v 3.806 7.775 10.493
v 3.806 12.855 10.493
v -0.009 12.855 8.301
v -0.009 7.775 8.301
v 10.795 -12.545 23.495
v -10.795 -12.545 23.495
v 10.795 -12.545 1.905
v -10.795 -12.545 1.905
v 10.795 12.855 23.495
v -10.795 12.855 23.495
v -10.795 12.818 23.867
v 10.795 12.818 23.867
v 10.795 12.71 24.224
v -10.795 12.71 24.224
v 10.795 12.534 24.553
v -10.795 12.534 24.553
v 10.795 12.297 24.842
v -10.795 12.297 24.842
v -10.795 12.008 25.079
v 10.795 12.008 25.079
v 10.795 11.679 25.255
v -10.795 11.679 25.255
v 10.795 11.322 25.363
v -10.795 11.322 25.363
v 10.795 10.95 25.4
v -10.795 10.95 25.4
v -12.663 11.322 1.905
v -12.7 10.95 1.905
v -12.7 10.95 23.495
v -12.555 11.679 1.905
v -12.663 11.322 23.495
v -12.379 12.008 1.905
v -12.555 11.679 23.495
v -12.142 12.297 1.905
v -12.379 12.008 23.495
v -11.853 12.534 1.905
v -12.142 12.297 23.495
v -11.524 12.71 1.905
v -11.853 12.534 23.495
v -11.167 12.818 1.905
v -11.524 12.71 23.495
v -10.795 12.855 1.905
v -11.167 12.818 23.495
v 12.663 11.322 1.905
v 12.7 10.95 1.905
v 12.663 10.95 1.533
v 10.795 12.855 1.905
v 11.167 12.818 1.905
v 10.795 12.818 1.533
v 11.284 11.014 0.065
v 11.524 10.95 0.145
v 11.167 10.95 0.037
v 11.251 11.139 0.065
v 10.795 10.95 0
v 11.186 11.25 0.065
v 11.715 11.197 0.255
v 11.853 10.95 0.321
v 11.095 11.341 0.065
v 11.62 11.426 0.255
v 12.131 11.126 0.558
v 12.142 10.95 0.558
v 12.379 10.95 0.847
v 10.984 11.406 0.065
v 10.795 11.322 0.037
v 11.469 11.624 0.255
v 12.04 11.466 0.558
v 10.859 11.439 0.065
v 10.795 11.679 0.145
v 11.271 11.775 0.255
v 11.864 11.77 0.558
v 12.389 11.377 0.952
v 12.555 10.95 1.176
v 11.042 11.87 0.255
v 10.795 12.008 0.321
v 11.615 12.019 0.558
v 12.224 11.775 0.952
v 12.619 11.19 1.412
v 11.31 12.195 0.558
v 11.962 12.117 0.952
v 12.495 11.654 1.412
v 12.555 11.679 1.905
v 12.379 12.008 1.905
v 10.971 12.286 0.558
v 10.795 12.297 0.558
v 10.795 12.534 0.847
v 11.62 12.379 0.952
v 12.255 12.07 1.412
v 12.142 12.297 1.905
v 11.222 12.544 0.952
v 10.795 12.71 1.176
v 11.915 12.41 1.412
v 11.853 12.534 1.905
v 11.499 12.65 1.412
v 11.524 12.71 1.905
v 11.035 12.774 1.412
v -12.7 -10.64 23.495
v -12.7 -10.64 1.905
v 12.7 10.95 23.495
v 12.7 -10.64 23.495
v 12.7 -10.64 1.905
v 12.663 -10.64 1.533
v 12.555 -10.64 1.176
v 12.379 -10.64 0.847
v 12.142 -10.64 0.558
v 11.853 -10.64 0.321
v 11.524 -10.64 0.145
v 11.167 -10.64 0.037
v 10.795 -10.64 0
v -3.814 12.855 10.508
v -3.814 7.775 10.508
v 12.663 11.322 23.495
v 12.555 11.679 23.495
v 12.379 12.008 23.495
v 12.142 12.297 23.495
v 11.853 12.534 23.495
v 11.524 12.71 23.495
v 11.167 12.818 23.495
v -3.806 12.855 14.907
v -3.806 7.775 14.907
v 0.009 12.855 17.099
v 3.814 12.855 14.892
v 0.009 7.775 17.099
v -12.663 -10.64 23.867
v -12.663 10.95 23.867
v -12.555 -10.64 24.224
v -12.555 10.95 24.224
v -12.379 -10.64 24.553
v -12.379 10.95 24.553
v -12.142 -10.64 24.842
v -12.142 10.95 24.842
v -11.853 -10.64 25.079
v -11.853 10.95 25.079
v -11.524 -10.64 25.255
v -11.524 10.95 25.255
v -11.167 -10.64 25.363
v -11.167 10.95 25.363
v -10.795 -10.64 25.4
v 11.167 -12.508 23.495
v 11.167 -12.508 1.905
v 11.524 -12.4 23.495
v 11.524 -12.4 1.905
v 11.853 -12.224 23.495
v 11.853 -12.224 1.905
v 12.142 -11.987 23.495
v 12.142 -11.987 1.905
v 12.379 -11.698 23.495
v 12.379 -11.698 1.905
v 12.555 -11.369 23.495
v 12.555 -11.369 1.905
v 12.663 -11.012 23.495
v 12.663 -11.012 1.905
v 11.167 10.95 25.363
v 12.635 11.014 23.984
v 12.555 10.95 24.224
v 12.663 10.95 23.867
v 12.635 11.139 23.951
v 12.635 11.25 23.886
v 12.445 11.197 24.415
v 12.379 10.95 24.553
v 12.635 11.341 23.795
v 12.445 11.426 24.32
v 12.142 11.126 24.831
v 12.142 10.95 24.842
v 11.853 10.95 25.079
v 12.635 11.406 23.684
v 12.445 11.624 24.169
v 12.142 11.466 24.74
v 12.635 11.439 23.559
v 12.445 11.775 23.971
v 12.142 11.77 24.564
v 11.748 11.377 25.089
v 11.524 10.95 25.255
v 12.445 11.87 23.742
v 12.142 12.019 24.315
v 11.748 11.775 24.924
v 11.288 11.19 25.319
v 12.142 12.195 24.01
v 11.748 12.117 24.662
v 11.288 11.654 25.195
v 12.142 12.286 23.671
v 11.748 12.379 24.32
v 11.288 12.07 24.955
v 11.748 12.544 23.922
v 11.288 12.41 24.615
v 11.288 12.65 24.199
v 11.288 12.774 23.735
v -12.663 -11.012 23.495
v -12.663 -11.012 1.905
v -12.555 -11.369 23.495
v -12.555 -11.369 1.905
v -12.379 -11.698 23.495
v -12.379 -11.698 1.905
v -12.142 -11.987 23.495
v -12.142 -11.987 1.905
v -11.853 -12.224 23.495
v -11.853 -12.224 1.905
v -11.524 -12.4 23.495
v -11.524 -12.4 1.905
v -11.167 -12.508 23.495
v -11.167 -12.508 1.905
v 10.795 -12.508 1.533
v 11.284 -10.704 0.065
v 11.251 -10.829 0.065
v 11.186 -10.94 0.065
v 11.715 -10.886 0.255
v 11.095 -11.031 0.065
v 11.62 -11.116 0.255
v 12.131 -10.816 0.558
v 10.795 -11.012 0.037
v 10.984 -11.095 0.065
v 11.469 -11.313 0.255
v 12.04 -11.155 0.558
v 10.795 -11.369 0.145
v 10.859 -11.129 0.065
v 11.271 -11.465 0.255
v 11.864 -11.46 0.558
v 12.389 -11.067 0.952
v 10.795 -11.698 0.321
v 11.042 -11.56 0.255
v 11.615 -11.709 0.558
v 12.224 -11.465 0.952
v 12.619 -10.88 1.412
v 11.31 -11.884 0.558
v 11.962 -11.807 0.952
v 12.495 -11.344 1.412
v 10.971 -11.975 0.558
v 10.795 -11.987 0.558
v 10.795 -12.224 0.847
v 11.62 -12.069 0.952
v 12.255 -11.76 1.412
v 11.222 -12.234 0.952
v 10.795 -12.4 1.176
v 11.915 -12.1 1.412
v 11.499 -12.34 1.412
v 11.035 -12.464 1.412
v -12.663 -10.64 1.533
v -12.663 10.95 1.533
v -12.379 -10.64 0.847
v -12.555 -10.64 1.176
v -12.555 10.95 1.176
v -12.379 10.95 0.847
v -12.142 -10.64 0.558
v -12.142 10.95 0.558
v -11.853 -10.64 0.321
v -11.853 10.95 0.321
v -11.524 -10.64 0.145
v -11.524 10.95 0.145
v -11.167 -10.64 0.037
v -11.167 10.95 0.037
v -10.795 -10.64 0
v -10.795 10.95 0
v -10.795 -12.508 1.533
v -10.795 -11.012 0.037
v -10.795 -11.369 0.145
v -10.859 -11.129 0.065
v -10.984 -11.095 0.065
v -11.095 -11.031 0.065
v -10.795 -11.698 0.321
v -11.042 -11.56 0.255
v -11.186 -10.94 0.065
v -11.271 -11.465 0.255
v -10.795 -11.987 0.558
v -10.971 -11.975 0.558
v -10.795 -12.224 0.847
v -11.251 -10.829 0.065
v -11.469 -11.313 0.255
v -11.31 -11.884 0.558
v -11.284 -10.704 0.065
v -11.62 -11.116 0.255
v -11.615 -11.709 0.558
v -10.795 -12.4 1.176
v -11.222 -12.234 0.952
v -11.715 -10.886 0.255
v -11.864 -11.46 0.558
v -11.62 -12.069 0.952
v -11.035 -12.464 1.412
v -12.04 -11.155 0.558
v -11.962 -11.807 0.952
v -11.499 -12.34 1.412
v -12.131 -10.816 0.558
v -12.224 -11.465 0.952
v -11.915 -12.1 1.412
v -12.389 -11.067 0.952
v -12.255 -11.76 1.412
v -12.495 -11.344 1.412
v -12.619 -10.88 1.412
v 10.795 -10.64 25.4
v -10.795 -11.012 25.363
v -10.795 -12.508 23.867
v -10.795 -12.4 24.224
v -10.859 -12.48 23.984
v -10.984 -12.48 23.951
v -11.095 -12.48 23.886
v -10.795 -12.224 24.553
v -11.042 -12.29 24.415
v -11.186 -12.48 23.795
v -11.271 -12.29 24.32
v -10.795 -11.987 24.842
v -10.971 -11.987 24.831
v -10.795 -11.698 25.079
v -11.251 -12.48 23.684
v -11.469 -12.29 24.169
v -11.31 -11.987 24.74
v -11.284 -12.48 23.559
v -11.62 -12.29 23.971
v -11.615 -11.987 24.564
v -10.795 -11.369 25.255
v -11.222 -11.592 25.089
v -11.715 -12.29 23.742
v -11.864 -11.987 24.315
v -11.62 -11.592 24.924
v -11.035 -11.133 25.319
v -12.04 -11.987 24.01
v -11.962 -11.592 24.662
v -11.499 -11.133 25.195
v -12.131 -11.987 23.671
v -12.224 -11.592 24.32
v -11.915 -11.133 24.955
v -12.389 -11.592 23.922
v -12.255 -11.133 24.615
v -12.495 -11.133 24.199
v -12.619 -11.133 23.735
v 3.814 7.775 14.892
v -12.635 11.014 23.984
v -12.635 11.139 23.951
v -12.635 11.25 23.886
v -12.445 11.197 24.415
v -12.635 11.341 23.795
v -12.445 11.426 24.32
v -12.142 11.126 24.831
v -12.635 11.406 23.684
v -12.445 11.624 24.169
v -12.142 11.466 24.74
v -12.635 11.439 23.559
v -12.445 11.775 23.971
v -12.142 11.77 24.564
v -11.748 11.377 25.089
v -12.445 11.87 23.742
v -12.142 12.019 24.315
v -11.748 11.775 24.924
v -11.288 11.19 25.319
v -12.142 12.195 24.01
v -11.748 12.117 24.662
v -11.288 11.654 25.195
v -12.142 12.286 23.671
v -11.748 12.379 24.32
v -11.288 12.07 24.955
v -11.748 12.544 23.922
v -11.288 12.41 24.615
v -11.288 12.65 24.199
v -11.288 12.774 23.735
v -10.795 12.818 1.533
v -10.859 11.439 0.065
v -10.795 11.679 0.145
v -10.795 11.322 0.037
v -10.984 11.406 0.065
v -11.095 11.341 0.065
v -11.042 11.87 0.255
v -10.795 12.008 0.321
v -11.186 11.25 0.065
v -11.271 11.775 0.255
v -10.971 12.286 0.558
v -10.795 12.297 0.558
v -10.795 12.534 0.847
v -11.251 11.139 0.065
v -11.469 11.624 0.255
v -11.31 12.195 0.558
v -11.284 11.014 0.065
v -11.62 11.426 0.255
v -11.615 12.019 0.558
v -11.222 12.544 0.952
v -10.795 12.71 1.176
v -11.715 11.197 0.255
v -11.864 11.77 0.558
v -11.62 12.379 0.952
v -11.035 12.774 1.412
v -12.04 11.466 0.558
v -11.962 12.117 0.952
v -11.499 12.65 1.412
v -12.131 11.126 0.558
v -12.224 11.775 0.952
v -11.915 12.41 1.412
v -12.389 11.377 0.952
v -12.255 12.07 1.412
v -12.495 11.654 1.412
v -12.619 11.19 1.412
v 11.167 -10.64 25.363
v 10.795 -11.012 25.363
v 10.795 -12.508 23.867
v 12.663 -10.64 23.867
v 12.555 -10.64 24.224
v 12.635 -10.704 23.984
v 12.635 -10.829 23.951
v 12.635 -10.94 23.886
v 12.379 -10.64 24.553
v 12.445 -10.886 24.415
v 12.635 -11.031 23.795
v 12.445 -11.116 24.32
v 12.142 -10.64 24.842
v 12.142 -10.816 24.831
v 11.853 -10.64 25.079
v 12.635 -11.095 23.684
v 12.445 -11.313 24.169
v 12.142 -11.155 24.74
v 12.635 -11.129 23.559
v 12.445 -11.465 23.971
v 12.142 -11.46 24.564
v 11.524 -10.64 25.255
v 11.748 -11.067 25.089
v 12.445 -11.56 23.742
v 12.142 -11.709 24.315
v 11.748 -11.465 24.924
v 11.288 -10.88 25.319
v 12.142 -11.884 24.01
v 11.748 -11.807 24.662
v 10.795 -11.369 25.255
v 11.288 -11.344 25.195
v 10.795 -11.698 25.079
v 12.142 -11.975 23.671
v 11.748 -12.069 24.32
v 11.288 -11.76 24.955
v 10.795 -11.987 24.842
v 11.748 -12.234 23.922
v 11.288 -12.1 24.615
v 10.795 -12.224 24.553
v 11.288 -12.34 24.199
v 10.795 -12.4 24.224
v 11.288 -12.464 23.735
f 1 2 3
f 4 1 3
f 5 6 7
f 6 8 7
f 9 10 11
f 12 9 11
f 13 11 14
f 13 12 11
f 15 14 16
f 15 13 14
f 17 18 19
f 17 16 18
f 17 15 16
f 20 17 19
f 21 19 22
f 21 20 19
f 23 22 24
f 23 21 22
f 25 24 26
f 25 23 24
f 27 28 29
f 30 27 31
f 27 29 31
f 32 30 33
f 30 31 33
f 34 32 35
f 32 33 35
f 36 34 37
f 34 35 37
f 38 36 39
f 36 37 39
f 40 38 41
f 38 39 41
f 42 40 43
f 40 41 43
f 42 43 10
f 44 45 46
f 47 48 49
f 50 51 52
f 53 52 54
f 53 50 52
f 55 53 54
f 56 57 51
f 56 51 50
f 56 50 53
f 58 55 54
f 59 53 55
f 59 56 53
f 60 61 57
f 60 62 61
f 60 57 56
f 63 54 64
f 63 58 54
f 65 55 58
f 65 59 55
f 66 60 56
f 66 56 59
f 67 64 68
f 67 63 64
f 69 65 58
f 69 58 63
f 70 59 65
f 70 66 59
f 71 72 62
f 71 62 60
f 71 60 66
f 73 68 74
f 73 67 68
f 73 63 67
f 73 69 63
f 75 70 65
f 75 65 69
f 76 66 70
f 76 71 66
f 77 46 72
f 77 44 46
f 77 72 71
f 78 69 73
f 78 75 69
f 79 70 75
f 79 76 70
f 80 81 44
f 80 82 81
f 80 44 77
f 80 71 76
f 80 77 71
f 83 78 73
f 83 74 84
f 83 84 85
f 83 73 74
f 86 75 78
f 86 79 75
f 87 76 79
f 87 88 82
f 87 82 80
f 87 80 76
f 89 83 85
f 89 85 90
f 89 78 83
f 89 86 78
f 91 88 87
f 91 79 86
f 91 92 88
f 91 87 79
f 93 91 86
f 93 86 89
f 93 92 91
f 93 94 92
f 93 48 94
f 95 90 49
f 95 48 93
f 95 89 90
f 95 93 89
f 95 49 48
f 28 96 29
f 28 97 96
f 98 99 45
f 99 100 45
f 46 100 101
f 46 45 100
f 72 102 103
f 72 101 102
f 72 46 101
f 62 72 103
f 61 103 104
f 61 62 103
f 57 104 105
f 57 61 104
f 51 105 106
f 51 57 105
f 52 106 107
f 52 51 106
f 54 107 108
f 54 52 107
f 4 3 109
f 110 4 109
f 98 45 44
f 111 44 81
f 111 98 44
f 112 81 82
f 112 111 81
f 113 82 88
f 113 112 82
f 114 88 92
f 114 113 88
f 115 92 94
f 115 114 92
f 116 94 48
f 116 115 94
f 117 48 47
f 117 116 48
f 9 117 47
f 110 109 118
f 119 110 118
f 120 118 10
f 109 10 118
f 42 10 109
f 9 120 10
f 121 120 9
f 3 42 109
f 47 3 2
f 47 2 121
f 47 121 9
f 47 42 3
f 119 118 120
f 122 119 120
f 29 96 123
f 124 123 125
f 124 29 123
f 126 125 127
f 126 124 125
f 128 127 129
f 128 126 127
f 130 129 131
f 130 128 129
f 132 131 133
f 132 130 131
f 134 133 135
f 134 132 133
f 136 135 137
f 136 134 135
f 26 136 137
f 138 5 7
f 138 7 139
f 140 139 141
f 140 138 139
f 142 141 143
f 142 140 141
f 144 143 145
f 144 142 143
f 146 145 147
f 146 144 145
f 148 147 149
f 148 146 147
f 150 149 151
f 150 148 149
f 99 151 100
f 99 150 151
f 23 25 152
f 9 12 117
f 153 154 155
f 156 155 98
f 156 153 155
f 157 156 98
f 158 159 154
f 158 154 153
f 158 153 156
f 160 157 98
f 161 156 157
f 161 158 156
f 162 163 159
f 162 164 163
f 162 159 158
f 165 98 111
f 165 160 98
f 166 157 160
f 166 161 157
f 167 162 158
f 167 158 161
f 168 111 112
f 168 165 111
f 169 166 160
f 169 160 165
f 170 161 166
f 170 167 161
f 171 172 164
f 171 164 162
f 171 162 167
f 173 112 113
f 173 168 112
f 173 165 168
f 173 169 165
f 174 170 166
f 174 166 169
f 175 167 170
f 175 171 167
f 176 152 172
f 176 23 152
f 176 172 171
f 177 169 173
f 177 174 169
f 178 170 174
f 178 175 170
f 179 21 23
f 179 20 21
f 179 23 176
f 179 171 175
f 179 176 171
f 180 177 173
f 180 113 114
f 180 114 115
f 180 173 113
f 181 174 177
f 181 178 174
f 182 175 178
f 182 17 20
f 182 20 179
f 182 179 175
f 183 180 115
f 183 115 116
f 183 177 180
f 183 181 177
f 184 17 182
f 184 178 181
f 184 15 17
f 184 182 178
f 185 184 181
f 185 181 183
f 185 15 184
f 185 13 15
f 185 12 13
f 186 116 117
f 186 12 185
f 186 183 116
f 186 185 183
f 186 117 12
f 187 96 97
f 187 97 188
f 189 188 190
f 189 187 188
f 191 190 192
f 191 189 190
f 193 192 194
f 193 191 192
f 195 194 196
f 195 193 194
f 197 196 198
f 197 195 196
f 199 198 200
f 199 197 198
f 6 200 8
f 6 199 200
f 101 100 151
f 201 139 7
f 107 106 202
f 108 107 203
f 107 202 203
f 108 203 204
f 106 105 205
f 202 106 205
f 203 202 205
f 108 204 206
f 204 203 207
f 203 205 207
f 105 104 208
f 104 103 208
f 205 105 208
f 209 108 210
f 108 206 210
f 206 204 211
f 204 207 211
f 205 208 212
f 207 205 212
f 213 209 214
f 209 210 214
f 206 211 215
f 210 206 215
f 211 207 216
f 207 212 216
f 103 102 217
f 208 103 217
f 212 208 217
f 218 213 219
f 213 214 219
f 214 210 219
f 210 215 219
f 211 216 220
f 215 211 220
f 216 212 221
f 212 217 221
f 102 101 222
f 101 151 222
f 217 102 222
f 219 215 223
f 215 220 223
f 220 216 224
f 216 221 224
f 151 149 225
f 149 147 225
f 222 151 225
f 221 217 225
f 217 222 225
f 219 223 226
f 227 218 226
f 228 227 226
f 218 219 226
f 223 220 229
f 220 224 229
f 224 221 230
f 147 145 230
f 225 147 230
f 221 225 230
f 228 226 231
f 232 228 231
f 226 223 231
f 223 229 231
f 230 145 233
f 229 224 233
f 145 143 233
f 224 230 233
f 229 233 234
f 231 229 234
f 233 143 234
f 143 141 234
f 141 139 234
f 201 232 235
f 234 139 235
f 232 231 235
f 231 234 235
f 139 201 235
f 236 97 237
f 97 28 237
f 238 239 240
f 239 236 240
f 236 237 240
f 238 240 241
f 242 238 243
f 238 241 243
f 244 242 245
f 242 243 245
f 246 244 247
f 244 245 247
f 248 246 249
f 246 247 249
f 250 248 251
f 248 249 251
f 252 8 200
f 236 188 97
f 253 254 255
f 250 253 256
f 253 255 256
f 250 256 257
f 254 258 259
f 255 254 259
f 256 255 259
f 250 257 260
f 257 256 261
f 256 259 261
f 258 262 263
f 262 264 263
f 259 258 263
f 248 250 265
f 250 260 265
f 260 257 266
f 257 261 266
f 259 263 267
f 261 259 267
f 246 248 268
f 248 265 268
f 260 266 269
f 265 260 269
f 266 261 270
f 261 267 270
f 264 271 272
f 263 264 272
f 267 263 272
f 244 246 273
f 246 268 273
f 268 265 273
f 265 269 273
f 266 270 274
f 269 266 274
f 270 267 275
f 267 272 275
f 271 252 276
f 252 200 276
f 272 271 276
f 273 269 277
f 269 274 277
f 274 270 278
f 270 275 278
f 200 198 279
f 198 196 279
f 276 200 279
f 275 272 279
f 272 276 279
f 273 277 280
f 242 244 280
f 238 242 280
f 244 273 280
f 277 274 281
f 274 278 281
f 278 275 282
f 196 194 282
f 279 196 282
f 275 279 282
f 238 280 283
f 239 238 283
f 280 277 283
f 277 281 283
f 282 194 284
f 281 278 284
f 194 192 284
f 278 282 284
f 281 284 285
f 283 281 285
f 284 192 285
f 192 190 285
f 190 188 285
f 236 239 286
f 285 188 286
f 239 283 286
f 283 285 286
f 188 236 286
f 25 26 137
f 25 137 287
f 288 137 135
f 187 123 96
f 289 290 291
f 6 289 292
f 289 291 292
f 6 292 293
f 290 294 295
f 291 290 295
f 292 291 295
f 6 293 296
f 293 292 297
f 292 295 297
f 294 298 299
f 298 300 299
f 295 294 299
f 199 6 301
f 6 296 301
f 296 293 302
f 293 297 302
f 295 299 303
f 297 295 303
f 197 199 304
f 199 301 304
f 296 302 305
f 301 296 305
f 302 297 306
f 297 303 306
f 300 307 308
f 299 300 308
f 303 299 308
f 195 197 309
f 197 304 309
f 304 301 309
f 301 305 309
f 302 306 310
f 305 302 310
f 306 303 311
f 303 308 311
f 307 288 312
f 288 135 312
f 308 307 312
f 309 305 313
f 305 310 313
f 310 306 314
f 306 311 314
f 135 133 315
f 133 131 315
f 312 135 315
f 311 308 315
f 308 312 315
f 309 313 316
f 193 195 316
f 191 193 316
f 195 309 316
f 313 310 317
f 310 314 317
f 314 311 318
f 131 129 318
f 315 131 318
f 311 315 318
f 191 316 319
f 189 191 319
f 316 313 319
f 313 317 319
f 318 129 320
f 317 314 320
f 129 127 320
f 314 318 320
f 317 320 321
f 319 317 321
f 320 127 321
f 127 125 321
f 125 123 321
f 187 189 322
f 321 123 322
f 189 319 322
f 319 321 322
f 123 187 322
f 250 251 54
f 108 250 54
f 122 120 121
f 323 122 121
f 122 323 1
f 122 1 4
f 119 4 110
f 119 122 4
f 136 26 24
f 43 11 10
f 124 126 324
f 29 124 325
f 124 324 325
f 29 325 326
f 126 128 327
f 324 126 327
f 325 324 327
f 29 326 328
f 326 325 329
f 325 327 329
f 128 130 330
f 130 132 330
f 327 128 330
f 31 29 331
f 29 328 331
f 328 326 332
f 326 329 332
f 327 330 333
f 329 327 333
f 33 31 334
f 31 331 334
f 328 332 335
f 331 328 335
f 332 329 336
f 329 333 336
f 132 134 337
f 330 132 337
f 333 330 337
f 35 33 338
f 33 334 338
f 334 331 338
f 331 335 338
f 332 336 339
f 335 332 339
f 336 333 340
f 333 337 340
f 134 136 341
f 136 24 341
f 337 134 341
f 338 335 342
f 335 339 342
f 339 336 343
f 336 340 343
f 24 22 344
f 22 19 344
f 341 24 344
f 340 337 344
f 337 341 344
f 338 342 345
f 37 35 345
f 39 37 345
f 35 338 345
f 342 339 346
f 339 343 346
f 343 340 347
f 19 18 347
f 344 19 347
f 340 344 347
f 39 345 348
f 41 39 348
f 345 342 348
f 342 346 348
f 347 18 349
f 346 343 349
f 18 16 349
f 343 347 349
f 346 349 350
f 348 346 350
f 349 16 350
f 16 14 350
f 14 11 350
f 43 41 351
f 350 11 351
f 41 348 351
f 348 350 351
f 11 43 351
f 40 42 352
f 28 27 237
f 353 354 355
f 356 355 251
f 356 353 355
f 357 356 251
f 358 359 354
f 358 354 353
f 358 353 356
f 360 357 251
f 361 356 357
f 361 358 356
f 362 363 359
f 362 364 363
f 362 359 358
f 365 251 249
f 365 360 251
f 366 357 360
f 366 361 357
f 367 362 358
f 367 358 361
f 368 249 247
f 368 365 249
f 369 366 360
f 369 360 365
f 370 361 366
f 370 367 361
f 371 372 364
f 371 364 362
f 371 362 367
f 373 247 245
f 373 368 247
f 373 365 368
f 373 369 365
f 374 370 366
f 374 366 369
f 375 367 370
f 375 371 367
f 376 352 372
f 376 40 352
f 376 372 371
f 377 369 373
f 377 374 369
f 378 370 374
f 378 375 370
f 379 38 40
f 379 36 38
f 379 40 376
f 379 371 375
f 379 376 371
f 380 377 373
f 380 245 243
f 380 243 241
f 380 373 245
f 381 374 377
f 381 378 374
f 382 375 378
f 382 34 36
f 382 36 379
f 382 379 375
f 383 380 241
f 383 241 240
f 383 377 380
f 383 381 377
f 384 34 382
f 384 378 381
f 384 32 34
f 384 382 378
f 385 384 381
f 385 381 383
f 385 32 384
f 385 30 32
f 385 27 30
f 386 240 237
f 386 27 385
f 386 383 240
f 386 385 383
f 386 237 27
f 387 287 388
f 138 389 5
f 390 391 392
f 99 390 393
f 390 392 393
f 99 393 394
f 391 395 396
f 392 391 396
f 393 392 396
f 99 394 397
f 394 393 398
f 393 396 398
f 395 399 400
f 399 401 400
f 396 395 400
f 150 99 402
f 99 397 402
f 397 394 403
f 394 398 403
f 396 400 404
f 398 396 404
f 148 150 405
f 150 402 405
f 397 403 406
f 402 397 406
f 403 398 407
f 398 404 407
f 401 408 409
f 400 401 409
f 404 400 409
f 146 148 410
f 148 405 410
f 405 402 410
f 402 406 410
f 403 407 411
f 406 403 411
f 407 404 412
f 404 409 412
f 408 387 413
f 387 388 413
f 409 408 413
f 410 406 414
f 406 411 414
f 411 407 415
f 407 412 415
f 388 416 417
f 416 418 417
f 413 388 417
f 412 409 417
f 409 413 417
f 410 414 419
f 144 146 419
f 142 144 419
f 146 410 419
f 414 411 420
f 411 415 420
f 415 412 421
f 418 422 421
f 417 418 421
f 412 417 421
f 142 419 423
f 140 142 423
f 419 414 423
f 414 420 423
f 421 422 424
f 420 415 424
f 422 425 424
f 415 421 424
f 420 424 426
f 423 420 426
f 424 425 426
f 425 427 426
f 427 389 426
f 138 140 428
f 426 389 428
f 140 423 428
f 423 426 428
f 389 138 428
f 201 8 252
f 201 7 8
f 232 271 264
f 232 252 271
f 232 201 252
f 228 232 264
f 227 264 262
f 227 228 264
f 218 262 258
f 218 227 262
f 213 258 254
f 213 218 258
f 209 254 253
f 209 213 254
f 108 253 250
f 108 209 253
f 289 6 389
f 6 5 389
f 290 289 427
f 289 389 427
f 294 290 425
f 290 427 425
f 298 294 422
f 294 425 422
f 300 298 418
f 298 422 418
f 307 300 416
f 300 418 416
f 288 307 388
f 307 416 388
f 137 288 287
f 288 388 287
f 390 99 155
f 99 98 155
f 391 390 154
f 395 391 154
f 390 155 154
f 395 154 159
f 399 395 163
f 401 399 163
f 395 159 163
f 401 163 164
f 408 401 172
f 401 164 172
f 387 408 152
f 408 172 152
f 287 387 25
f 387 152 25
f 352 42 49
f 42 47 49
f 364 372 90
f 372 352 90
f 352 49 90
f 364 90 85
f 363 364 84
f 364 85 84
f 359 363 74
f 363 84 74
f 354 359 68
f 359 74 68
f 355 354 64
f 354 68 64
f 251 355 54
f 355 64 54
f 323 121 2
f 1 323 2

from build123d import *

# Parameters (mm, degrees)
F0_W     = 25.4
F0_H     = 25.4
F1_DEPTH = 25.4
F2_R     = 1.905
F4_DEPTH = 5.08


with BuildPart() as f1:
    # F0 (on Top) → F1 (new body)
    with BuildSketch(Plane.XY):
        with Locations((0, 0.155061)):
            Rectangle(F0_W, F0_H)
    extrude(amount=F1_DEPTH)

    # F2
    f2_edges = [f1.edges().sort_by_distance(p)[0] for p in [
        (0, 12.855061, 25.4),
        (-12.7, 0.155061, 25.4),
        (0, -12.544939, 25.4),
        (12.7, 0.155061, 25.4),
        (12.7, -12.544939, 12.7),
        (12.7, 12.855061, 12.7),
        (12.7, 0.155061, 0),
        (-12.7, -12.544939, 12.7),
        (0, -12.544939, 0),
        (-12.7, 12.855061, 12.7),
        (0, 12.855061, 0),
        (-12.7, 0.155061, 0),
    ]]
    fillet(f2_edges, radius=F2_R)

    # F3 (on face) → F4 (cut)
    with BuildSketch(Plane(origin=(0, 12.855061, 0), x_dir=(-1, 0, 0), z_dir=(0, 1, 0))):
        Polygon((0.008823, 8.3006), (3.814404, 10.50794), (3.805581, 14.907341), (-0.008823, 17.0994), (-3.814404, 14.89206), (-3.805581, 10.492659), align=None)
    extrude(amount=-F4_DEPTH, mode=Mode.SUBTRACT)


solid = f1.part
